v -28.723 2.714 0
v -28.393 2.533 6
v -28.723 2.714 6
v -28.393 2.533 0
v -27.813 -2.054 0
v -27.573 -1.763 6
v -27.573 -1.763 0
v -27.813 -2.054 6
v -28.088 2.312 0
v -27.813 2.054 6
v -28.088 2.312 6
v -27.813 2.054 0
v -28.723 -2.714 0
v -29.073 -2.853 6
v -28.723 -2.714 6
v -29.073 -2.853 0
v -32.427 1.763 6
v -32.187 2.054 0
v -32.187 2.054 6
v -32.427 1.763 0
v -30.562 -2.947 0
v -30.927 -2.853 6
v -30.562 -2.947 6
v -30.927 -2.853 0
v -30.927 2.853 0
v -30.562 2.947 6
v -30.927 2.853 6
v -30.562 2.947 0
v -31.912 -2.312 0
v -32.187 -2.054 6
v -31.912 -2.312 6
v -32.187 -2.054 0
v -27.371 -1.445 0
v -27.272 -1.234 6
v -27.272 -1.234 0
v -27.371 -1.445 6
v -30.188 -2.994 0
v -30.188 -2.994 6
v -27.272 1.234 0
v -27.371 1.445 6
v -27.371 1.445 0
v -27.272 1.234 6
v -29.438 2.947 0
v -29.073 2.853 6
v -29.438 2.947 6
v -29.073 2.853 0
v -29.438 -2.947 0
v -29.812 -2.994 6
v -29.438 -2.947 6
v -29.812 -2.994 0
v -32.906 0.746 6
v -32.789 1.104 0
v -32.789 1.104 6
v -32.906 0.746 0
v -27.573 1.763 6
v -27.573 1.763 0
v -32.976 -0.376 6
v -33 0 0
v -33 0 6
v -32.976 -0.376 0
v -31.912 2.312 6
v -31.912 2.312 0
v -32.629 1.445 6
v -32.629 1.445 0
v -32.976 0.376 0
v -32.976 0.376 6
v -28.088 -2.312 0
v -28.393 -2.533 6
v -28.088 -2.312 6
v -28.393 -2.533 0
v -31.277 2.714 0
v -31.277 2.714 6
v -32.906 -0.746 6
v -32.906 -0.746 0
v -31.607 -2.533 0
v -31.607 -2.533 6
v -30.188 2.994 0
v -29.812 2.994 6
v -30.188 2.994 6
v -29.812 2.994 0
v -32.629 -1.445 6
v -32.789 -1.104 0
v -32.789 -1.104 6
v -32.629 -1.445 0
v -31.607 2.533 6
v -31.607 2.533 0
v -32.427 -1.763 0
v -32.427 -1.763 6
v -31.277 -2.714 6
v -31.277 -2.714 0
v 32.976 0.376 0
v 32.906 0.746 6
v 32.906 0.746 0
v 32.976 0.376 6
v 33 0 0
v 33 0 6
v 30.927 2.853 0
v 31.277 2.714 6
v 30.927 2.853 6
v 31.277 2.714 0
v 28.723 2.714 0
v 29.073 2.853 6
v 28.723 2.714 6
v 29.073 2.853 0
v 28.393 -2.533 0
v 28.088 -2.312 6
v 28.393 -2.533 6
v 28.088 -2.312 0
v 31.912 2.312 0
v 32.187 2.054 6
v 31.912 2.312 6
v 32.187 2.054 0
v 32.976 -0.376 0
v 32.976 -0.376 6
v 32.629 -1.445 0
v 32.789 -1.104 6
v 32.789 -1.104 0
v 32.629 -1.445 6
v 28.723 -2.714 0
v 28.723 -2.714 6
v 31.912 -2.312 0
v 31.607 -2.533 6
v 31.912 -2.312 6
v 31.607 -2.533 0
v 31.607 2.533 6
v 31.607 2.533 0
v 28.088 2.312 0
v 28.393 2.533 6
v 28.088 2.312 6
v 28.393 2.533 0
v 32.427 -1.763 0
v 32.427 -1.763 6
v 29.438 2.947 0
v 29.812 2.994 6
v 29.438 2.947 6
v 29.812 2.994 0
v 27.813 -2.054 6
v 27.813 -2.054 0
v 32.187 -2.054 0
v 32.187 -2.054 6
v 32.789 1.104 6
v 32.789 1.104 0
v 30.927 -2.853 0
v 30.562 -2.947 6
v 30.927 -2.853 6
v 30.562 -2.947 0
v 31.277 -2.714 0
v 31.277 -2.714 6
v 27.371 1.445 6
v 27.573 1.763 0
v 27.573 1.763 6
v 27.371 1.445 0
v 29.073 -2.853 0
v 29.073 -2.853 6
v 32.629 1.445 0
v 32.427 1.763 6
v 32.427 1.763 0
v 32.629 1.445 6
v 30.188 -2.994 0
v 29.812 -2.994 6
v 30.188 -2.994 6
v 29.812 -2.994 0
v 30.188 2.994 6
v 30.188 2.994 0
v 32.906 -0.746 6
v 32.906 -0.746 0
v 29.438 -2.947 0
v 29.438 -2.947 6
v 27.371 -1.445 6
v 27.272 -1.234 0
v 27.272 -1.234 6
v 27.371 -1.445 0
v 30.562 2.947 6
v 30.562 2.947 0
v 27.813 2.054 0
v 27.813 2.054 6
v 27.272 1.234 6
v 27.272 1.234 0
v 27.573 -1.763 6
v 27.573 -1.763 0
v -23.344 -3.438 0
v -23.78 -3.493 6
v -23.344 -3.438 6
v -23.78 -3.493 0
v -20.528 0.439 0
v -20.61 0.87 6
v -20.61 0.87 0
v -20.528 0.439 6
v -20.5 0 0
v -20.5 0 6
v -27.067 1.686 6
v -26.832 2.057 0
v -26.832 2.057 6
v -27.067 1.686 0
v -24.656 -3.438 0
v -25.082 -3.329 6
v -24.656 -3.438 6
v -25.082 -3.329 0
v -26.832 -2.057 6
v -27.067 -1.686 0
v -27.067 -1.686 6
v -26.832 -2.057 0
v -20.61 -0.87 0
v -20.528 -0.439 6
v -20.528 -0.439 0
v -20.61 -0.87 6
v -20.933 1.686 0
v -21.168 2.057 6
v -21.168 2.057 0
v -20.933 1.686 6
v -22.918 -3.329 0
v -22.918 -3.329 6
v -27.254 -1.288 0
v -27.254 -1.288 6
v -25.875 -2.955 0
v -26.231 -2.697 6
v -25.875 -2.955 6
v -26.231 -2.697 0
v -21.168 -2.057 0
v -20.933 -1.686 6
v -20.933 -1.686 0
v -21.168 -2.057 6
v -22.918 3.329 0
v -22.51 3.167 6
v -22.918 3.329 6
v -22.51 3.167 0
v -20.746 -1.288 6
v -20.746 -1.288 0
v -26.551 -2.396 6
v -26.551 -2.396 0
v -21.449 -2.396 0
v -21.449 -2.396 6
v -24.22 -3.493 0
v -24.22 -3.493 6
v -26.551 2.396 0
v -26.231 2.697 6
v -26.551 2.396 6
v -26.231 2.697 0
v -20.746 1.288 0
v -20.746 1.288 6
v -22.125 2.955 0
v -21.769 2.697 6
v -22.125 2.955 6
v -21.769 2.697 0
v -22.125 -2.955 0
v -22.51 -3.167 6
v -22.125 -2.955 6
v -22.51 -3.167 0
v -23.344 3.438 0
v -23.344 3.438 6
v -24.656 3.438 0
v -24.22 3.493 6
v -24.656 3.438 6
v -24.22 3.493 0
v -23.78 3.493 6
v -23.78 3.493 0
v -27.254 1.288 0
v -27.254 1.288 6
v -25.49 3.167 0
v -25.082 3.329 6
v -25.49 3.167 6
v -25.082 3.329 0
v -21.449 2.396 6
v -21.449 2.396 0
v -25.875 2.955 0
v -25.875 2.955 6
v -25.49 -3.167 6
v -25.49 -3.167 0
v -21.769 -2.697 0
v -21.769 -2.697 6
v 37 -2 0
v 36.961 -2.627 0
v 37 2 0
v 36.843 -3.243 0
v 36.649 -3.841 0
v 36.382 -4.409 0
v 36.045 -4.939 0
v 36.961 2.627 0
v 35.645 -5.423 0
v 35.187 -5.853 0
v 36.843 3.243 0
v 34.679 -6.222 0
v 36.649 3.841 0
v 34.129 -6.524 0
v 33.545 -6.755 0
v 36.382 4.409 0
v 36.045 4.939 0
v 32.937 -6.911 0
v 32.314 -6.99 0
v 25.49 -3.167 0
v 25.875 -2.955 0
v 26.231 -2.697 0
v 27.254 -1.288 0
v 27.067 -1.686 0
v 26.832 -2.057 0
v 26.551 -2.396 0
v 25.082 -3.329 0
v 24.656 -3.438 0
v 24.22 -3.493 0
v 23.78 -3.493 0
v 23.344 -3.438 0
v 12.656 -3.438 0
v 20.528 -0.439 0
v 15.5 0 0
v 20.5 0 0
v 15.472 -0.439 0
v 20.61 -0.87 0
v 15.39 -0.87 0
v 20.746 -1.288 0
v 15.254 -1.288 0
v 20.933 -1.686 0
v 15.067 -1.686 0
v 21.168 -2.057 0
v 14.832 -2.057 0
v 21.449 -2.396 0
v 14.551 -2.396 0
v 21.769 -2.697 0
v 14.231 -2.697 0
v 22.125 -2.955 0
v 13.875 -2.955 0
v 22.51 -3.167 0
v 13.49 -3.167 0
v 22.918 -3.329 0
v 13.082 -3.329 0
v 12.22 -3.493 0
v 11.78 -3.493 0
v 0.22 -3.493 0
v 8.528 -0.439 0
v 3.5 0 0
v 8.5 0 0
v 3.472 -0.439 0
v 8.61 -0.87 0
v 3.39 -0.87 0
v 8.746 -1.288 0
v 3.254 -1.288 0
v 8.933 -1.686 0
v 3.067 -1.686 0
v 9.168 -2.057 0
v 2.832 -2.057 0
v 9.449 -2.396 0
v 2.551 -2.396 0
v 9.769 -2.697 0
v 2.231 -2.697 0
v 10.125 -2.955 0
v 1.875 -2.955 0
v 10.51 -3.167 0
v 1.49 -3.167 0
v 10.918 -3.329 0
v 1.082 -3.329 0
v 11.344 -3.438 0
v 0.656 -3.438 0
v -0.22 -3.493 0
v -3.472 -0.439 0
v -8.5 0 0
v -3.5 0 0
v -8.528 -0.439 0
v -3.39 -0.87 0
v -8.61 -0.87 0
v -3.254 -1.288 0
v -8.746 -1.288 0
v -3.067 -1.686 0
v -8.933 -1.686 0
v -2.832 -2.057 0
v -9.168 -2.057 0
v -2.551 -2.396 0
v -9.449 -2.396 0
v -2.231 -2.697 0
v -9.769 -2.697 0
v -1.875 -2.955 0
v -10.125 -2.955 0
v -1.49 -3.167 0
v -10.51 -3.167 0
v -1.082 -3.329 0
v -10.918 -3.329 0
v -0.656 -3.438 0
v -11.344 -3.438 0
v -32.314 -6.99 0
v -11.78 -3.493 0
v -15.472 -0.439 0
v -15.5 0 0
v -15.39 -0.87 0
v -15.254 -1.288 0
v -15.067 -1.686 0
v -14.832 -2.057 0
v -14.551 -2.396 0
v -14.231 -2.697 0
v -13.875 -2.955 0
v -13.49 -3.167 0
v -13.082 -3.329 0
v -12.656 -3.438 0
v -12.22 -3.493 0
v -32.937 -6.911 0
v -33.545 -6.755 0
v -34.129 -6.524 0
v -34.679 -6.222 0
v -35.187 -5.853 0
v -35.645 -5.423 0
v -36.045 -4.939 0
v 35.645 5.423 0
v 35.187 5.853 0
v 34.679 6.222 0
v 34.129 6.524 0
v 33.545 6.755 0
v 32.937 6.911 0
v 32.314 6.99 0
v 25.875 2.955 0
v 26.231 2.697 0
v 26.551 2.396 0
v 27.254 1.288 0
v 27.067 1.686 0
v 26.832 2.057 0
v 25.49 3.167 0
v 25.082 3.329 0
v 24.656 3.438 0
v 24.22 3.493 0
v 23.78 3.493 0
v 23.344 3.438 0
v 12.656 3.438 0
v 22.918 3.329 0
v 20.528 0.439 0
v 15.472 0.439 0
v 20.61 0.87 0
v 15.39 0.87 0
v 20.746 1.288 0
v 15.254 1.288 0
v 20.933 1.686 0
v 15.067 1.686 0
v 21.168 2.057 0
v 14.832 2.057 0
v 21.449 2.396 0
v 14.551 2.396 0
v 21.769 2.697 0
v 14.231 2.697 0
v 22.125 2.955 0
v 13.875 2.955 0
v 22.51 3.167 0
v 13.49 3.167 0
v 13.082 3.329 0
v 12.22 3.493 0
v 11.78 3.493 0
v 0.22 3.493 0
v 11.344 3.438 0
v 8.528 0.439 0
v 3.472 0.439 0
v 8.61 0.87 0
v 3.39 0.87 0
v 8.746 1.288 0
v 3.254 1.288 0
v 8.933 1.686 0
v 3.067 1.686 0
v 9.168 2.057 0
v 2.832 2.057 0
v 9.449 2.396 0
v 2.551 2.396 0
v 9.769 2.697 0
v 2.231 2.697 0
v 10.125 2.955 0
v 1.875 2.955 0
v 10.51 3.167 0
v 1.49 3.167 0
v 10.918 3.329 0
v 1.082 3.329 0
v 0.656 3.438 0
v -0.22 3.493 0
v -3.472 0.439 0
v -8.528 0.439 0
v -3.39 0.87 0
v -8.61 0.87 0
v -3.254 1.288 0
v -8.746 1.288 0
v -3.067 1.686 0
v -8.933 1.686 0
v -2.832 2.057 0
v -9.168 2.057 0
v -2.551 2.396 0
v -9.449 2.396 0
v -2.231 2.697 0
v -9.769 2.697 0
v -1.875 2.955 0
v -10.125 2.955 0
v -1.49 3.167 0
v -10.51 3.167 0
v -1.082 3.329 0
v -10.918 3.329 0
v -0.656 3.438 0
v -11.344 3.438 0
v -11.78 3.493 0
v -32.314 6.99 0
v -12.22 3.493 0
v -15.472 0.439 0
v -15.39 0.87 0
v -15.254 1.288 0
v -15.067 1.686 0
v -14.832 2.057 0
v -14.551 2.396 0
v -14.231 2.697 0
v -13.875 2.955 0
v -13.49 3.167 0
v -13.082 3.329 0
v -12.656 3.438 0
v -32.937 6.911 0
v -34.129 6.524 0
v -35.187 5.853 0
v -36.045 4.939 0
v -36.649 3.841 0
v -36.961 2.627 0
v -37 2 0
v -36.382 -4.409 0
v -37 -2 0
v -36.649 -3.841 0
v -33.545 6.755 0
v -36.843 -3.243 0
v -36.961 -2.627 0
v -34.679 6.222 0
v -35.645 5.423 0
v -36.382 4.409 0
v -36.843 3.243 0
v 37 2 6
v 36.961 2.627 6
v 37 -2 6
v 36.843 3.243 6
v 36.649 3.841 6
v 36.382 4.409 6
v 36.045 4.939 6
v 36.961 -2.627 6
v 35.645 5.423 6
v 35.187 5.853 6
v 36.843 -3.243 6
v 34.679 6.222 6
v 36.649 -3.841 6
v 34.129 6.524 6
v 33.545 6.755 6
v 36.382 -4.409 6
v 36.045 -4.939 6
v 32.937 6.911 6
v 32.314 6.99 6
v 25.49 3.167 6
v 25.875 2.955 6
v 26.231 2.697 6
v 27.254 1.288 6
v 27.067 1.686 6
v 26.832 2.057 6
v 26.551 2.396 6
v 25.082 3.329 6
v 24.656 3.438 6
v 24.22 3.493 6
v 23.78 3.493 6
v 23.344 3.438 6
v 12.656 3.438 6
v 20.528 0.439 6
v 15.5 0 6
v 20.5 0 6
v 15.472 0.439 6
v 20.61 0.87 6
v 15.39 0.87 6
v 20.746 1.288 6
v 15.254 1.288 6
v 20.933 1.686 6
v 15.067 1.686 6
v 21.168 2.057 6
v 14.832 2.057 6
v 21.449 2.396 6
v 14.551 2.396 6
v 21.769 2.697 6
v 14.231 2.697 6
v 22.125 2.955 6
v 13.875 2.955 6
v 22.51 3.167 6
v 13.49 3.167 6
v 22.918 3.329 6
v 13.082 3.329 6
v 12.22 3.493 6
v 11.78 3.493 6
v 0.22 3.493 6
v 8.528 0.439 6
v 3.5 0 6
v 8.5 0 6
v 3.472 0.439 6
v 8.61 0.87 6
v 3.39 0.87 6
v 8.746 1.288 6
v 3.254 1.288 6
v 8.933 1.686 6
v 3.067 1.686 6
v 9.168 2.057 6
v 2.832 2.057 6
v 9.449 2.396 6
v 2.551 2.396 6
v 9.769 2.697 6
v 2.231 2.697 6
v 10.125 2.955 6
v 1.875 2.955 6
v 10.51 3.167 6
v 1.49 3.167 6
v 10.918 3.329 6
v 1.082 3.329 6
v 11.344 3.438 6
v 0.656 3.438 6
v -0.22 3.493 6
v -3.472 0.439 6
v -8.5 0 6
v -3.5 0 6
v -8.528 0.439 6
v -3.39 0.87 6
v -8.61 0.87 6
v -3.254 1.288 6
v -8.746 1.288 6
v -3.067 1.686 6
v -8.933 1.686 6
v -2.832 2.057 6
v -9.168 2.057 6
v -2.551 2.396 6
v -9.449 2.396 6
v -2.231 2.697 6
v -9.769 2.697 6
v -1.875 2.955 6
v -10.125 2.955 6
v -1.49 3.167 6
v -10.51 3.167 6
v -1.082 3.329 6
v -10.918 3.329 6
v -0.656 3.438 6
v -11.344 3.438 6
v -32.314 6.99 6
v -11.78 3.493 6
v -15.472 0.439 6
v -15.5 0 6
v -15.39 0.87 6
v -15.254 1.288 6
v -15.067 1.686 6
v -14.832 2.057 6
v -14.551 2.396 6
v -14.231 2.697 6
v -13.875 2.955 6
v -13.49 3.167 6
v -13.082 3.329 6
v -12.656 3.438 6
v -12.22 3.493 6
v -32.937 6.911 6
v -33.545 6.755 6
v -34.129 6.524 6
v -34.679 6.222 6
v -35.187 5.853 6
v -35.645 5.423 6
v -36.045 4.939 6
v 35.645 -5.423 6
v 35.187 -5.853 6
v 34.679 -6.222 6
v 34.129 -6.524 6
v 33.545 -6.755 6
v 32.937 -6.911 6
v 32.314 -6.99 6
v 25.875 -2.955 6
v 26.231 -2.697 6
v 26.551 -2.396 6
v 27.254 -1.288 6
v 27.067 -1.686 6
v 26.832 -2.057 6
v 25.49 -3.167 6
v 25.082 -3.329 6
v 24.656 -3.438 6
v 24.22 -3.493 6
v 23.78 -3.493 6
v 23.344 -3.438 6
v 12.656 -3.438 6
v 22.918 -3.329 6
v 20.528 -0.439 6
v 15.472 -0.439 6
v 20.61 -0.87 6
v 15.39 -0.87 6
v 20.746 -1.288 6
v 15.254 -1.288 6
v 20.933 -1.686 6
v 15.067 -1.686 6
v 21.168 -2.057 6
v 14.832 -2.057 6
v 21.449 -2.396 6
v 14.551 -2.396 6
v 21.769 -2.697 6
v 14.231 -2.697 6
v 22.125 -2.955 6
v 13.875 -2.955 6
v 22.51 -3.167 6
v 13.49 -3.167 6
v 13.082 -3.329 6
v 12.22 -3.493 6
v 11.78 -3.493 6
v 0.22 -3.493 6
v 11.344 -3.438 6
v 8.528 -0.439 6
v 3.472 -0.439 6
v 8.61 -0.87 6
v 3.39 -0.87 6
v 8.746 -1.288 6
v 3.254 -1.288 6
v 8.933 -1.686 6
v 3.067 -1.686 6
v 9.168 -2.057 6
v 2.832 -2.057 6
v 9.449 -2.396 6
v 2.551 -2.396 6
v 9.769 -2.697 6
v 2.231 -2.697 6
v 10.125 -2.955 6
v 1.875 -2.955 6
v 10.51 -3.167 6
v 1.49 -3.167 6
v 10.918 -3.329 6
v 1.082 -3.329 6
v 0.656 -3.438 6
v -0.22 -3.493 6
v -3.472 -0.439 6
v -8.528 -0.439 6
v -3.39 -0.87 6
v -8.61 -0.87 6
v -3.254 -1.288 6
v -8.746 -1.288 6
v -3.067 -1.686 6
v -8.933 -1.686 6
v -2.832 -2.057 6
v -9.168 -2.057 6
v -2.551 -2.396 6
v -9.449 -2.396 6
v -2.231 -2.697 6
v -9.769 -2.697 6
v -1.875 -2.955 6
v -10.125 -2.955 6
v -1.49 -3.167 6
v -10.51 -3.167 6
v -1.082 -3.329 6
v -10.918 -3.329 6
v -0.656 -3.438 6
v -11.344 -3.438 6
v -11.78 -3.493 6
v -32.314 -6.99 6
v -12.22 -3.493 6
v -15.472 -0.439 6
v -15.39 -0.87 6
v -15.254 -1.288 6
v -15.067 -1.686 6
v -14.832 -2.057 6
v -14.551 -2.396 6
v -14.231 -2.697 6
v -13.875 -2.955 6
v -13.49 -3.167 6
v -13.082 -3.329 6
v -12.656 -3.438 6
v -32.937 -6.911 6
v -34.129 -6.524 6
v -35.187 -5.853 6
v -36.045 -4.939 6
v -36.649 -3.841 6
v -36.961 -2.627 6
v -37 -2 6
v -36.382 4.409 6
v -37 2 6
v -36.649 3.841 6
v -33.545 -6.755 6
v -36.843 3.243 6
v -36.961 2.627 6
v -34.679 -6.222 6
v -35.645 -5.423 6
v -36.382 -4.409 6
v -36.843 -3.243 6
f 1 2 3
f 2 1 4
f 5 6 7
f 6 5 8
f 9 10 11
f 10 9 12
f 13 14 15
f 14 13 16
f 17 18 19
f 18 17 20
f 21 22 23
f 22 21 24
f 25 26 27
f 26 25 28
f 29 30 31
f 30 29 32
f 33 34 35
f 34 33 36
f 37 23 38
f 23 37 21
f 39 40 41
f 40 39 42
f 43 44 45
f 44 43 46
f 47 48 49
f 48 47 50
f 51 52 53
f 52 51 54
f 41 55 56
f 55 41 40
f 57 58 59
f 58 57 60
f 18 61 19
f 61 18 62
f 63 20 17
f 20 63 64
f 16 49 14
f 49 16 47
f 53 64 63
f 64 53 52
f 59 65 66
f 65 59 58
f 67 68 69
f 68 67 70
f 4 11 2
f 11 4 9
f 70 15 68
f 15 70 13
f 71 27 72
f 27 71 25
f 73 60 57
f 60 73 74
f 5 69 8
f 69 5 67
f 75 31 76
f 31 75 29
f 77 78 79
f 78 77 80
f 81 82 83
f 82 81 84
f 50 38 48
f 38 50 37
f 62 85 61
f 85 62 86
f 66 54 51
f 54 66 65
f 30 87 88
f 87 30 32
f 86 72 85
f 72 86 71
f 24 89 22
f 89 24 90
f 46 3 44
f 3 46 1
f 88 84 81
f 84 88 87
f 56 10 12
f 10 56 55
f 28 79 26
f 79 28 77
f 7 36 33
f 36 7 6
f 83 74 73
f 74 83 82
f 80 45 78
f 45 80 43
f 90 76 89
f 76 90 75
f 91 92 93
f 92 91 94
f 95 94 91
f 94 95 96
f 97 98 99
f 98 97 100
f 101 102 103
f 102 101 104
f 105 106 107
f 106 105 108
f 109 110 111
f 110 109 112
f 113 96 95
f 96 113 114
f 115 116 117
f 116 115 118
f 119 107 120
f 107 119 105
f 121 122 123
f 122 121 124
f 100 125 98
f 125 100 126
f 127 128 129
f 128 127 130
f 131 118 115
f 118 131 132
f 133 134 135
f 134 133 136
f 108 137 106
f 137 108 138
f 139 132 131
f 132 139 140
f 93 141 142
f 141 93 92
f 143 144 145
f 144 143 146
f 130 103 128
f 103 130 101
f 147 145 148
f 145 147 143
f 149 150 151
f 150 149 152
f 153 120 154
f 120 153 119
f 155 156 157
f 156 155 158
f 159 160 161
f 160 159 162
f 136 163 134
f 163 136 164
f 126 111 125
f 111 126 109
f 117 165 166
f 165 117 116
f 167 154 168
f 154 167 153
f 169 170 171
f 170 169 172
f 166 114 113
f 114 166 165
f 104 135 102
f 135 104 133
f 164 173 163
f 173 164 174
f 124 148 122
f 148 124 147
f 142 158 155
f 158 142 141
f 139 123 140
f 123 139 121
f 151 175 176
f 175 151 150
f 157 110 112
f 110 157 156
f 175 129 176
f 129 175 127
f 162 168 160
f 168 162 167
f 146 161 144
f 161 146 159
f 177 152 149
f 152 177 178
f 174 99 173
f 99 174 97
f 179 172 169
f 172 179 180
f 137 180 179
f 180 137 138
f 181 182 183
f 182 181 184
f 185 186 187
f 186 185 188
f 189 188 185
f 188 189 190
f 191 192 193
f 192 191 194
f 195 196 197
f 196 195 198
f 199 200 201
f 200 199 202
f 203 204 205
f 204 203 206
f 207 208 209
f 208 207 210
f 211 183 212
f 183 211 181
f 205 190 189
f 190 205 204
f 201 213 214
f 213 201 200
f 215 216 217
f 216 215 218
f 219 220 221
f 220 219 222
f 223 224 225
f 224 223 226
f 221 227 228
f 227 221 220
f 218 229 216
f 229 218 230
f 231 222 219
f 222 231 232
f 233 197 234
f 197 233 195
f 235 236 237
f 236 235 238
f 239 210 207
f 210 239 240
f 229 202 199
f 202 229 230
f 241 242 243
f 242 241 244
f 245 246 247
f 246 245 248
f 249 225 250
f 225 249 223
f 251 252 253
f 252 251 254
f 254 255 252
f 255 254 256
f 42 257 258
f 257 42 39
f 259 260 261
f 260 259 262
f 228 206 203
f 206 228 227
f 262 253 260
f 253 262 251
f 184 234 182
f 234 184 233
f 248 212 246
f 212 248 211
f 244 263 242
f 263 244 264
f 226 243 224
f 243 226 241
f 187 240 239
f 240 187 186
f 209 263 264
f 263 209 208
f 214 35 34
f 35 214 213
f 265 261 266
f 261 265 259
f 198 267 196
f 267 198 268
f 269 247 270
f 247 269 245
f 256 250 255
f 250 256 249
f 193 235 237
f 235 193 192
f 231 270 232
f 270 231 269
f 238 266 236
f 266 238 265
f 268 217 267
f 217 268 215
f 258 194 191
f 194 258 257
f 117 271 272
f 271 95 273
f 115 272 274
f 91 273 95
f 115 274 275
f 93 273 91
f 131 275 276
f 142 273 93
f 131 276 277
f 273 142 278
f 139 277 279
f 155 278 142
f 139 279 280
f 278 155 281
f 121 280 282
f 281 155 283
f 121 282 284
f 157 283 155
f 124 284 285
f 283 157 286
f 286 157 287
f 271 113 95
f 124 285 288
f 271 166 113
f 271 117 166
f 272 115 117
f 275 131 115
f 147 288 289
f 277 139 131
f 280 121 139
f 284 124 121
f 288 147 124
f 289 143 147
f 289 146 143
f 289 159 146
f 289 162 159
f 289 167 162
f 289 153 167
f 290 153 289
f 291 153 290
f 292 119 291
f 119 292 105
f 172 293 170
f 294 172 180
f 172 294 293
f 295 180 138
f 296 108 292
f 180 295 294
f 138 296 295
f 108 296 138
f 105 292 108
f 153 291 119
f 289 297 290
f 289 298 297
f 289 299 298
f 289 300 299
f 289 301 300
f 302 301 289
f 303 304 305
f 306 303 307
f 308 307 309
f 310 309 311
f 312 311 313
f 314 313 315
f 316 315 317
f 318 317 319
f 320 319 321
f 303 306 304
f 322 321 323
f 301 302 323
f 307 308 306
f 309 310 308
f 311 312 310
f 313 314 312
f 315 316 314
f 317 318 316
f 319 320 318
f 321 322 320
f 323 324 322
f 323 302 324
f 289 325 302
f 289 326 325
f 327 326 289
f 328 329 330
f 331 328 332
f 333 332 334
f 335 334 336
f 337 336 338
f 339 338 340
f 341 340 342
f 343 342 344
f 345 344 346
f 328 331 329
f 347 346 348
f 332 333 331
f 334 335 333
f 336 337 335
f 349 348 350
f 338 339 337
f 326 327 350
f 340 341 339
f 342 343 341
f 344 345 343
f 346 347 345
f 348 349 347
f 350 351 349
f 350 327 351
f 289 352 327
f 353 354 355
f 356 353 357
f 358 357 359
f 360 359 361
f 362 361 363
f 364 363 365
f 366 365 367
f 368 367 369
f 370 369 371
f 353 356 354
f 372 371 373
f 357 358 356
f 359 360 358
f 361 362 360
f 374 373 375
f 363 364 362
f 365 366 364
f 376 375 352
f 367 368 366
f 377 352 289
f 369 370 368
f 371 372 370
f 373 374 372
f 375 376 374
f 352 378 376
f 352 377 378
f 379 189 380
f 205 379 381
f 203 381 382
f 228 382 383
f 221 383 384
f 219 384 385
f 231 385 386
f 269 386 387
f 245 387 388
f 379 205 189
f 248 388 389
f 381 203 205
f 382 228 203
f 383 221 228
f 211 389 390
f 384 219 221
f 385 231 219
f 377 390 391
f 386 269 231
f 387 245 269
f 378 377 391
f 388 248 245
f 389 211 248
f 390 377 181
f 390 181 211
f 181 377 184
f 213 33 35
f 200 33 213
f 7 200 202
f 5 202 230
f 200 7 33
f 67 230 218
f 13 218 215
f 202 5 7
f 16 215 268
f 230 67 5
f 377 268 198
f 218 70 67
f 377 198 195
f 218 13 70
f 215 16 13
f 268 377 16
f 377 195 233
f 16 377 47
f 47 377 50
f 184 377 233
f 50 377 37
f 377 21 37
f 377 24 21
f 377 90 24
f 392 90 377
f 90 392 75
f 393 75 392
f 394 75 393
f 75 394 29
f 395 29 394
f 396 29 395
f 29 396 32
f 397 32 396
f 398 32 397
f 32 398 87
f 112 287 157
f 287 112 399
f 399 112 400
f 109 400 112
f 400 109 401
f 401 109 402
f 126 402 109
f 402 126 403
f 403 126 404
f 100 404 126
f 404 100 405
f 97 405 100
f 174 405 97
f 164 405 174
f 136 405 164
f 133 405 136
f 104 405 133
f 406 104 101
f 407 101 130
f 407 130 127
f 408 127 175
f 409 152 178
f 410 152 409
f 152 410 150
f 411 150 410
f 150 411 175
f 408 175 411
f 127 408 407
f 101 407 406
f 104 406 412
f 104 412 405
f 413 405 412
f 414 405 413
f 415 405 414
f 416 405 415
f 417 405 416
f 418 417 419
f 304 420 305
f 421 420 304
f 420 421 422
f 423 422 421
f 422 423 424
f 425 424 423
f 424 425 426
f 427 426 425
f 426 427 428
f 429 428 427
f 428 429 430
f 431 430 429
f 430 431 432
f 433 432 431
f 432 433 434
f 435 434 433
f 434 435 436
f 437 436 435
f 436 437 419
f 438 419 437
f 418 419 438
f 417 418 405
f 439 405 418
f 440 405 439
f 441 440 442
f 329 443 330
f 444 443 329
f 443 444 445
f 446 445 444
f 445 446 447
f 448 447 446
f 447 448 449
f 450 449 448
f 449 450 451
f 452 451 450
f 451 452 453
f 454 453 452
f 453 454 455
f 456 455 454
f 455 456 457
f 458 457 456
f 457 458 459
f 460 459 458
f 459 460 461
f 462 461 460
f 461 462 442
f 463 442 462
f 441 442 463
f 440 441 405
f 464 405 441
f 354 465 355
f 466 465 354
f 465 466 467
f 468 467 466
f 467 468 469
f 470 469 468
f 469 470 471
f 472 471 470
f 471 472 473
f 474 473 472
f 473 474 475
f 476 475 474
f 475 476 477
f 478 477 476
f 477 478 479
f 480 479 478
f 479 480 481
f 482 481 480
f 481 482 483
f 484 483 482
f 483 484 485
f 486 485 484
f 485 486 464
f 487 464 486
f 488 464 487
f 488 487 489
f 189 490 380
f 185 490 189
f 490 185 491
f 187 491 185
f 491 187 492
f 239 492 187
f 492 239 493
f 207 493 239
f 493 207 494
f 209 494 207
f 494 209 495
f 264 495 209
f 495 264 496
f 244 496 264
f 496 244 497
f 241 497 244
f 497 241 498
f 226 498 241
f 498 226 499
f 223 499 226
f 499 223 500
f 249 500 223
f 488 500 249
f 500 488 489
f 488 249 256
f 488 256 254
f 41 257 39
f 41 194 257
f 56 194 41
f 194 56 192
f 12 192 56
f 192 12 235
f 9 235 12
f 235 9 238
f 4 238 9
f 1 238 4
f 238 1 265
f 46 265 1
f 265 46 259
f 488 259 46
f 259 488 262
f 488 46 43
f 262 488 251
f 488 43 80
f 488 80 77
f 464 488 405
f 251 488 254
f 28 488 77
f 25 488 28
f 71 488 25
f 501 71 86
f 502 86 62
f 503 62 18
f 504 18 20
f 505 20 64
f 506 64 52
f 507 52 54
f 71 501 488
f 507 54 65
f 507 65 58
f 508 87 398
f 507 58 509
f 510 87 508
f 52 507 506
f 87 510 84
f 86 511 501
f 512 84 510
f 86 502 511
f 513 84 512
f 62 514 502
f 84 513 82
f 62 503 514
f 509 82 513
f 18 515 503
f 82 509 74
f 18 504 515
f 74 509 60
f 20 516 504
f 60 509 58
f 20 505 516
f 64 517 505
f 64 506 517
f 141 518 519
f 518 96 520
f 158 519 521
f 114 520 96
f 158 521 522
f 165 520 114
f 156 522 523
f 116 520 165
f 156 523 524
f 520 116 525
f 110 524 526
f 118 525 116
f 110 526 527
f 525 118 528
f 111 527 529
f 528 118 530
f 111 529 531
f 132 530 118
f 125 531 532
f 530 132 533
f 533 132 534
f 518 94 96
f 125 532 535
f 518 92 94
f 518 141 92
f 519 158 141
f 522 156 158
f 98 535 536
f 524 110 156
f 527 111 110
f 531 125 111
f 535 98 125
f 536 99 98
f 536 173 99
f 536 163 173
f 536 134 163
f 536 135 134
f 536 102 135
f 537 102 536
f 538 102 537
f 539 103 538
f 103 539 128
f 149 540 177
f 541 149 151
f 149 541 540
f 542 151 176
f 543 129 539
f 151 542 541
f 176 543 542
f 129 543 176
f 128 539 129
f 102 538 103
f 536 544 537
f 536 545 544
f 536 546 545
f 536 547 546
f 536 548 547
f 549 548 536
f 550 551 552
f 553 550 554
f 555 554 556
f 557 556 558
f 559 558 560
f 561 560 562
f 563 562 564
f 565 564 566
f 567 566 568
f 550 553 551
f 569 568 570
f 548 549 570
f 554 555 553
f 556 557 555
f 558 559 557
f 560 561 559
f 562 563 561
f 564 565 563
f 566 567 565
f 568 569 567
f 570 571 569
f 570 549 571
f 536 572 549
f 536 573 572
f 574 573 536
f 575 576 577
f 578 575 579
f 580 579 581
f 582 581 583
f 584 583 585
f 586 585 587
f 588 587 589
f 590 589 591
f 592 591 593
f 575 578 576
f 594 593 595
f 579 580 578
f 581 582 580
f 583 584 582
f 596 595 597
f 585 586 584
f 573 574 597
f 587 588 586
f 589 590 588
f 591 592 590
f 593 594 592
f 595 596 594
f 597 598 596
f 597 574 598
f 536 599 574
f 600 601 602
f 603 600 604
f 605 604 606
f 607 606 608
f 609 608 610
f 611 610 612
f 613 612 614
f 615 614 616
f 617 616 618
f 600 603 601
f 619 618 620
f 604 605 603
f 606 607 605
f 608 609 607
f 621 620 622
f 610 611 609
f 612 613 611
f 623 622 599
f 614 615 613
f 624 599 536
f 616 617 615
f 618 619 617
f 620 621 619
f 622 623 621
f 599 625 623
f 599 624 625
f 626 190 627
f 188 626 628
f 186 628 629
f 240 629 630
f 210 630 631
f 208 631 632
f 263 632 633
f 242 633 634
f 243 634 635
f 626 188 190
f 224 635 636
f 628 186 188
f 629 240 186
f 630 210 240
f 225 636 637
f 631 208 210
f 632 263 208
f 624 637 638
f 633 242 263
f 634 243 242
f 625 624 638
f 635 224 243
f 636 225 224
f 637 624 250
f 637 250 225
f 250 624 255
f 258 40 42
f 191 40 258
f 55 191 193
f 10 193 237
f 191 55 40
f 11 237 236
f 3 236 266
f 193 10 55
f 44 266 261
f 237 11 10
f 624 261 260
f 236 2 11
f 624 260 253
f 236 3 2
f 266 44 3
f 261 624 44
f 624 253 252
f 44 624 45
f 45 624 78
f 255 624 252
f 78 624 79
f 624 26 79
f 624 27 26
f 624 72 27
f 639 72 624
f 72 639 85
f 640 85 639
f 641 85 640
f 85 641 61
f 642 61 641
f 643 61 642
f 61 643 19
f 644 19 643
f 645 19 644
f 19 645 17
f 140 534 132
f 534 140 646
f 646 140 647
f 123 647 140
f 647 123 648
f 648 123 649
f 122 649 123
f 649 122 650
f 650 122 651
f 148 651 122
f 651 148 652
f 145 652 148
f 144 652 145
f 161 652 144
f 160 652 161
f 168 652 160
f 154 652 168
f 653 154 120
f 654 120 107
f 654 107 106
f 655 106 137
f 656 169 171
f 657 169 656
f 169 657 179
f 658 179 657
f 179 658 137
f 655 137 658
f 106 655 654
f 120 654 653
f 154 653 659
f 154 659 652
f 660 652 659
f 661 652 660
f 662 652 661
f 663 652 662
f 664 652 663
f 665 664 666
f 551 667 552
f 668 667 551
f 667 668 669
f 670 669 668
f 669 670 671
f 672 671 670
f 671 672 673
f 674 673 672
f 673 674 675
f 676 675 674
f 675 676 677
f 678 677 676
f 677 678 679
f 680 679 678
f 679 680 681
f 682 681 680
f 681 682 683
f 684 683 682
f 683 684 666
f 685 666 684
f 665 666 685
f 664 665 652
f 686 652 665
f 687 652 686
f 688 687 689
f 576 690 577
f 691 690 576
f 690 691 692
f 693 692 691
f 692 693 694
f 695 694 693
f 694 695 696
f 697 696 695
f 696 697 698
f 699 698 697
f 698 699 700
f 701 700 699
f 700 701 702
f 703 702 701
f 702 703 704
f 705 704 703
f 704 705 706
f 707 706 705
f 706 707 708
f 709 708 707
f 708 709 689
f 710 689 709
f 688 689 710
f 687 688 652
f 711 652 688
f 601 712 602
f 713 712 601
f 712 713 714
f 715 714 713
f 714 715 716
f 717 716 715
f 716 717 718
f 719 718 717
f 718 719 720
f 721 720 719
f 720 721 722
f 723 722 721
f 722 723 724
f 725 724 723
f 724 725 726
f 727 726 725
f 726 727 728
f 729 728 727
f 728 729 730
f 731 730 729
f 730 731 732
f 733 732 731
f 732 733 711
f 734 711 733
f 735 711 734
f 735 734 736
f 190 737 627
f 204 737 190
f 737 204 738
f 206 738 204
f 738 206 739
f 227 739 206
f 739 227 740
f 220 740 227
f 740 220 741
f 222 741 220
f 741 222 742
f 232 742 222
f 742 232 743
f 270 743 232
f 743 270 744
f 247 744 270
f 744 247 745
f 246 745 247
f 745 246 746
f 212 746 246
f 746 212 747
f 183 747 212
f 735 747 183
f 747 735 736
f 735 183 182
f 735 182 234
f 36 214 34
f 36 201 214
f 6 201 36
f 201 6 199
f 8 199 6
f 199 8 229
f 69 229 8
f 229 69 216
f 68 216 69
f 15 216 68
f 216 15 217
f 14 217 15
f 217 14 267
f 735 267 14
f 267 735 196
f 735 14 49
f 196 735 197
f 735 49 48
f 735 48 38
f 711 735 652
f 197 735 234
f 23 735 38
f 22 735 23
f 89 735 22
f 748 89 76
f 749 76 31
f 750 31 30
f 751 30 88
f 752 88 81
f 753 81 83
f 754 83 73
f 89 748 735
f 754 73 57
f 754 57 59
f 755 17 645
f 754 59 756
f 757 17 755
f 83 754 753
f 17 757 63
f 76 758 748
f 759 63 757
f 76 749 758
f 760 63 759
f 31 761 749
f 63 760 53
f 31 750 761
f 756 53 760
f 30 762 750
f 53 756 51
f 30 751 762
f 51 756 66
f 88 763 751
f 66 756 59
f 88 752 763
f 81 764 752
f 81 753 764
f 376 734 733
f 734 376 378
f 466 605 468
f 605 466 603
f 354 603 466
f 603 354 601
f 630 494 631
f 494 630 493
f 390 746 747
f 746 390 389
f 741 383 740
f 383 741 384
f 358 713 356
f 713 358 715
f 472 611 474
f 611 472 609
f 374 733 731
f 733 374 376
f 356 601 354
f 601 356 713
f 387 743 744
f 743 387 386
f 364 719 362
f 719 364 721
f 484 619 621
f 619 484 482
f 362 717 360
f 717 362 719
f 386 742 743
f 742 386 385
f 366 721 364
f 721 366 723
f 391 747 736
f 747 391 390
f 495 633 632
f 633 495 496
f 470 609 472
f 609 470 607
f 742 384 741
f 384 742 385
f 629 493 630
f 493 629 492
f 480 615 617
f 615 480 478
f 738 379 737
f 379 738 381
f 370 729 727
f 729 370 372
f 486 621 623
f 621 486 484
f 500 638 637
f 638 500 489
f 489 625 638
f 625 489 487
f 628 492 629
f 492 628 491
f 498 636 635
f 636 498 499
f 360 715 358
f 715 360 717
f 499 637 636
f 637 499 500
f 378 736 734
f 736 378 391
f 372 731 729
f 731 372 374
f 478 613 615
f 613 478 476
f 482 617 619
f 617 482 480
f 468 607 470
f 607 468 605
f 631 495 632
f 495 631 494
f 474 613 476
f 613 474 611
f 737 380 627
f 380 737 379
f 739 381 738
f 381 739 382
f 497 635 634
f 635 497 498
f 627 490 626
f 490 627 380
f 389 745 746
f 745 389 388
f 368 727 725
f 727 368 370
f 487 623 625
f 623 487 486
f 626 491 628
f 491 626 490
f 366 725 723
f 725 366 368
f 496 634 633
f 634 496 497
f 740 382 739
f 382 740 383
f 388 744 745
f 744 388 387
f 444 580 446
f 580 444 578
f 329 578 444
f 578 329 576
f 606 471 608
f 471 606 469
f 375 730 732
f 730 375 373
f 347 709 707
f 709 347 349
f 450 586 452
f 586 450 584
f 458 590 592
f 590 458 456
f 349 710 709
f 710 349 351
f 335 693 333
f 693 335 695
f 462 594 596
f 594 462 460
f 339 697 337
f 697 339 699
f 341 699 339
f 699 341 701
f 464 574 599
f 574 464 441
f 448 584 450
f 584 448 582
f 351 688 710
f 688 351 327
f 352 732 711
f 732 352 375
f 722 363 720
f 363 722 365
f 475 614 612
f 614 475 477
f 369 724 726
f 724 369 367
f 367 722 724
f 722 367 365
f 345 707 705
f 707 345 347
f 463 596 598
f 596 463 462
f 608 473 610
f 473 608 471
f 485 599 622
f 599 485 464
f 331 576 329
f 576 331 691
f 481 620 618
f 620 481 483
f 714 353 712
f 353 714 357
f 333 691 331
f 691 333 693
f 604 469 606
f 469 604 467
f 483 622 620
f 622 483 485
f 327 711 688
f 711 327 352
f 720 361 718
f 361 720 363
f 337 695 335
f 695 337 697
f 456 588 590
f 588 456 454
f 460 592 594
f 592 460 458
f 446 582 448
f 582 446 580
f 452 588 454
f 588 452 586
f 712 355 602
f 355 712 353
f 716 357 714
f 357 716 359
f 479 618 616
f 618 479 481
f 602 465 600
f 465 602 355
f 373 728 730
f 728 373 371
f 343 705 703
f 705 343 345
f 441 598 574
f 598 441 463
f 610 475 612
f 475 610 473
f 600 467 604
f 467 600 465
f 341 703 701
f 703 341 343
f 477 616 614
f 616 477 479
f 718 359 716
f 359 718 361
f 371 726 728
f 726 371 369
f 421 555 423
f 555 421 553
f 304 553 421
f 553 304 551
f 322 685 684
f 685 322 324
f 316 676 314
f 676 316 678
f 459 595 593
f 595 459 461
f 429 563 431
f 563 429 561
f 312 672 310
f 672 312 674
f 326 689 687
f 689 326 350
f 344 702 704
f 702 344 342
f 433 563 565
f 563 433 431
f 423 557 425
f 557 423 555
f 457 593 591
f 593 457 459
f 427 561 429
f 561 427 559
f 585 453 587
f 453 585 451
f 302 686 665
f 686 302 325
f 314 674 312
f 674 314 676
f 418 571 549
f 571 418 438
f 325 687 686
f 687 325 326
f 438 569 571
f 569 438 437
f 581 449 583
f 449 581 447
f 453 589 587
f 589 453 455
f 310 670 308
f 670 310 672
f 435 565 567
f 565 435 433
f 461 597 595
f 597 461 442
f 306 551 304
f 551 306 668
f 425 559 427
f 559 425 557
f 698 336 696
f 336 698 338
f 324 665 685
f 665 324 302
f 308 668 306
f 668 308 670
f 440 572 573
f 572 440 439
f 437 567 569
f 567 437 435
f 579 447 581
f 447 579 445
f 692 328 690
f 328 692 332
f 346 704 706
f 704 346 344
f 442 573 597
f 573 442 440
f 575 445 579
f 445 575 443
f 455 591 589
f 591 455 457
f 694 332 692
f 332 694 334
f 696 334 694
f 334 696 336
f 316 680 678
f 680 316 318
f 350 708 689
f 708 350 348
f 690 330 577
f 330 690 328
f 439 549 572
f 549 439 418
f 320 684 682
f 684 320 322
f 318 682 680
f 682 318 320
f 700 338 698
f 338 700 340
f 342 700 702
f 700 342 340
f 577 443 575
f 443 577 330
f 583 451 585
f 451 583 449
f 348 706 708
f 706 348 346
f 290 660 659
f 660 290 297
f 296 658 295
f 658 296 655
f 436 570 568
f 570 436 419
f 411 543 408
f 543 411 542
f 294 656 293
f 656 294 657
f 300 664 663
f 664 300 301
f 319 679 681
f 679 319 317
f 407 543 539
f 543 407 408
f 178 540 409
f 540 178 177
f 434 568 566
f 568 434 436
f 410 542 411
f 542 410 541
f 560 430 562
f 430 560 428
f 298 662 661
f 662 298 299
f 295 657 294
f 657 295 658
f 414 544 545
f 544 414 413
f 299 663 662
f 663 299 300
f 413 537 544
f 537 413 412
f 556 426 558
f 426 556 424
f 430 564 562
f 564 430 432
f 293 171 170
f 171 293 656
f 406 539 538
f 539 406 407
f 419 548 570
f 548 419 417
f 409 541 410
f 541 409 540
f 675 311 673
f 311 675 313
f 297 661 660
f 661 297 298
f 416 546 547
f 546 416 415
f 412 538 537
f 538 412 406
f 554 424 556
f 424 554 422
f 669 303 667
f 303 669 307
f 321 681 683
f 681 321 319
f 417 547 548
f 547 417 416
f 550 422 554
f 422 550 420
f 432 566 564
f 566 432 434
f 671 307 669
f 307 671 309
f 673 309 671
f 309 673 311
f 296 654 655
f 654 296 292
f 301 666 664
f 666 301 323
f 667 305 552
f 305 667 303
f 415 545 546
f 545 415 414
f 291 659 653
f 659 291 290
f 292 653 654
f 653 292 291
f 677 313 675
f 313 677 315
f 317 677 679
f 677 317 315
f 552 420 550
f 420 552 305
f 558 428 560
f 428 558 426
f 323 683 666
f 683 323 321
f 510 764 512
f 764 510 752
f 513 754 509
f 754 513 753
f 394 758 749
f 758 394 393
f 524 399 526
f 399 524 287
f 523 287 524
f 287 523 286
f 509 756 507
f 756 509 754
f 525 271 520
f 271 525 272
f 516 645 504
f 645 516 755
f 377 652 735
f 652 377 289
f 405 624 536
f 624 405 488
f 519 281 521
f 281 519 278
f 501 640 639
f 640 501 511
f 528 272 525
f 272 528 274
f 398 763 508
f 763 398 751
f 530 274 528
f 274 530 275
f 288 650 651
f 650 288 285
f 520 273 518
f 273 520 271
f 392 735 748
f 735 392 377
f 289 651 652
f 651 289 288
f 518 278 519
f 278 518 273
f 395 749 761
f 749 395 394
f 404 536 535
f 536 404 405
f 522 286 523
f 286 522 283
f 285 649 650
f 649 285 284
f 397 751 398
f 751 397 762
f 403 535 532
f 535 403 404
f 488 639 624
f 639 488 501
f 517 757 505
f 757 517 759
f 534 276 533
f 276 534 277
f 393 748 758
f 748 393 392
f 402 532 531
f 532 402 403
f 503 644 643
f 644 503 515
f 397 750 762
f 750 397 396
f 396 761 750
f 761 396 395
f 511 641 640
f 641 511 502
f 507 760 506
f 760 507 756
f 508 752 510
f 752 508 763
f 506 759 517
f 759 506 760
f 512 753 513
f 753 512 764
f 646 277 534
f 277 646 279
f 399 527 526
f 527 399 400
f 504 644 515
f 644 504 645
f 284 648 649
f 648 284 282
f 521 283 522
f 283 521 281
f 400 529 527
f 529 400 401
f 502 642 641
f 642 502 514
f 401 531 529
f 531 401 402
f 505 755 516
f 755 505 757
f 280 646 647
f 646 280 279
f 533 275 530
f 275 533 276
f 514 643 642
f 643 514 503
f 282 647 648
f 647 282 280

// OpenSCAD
$fn = 50;


difference() {
	union() {
		hull() {
			translate(v = [-32.0000000000, 2.0000000000, 0]) {
				cylinder(h = 6, r = 5);
			}
			translate(v = [32.0000000000, 2.0000000000, 0]) {
				cylinder(h = 6, r = 5);
			}
			translate(v = [-32.0000000000, -2.0000000000, 0]) {
				cylinder(h = 6, r = 5);
			}
			translate(v = [32.0000000000, -2.0000000000, 0]) {
				cylinder(h = 6, r = 5);
			}
		}
	}
	union() {
		#translate(v = [-30.0000000000, 0.0000000000, -100.0000000000]) {
			cylinder(h = 200, r = 3.0000000000);
		}
		#translate(v = [-30.0000000000, 0.0000000000, -100.0000000000]) {
			cylinder(h = 200, r = 3.0000000000);
		}
		#translate(v = [30.0000000000, 0.0000000000, -100.0000000000]) {
			cylinder(h = 200, r = 3.0000000000);
		}
		#translate(v = [30.0000000000, 0.0000000000, -100.0000000000]) {
			cylinder(h = 200, r = 3.0000000000);
		}
		#translate(v = [-24.0000000000, 0, 0]) {
			cylinder(h = 6, r = 3.5000000000);
		}
		#translate(v = [-12.0000000000, 0, 0]) {
			cylinder(h = 6, r = 3.5000000000);
		}
		#cylinder(h = 6, r = 3.5000000000);
		#translate(v = [12.0000000000, 0, 0]) {
			cylinder(h = 6, r = 3.5000000000);
		}
		#translate(v = [24.0000000000, 0, 0]) {
			cylinder(h = 6, r = 3.5000000000);
		}
	}
}
